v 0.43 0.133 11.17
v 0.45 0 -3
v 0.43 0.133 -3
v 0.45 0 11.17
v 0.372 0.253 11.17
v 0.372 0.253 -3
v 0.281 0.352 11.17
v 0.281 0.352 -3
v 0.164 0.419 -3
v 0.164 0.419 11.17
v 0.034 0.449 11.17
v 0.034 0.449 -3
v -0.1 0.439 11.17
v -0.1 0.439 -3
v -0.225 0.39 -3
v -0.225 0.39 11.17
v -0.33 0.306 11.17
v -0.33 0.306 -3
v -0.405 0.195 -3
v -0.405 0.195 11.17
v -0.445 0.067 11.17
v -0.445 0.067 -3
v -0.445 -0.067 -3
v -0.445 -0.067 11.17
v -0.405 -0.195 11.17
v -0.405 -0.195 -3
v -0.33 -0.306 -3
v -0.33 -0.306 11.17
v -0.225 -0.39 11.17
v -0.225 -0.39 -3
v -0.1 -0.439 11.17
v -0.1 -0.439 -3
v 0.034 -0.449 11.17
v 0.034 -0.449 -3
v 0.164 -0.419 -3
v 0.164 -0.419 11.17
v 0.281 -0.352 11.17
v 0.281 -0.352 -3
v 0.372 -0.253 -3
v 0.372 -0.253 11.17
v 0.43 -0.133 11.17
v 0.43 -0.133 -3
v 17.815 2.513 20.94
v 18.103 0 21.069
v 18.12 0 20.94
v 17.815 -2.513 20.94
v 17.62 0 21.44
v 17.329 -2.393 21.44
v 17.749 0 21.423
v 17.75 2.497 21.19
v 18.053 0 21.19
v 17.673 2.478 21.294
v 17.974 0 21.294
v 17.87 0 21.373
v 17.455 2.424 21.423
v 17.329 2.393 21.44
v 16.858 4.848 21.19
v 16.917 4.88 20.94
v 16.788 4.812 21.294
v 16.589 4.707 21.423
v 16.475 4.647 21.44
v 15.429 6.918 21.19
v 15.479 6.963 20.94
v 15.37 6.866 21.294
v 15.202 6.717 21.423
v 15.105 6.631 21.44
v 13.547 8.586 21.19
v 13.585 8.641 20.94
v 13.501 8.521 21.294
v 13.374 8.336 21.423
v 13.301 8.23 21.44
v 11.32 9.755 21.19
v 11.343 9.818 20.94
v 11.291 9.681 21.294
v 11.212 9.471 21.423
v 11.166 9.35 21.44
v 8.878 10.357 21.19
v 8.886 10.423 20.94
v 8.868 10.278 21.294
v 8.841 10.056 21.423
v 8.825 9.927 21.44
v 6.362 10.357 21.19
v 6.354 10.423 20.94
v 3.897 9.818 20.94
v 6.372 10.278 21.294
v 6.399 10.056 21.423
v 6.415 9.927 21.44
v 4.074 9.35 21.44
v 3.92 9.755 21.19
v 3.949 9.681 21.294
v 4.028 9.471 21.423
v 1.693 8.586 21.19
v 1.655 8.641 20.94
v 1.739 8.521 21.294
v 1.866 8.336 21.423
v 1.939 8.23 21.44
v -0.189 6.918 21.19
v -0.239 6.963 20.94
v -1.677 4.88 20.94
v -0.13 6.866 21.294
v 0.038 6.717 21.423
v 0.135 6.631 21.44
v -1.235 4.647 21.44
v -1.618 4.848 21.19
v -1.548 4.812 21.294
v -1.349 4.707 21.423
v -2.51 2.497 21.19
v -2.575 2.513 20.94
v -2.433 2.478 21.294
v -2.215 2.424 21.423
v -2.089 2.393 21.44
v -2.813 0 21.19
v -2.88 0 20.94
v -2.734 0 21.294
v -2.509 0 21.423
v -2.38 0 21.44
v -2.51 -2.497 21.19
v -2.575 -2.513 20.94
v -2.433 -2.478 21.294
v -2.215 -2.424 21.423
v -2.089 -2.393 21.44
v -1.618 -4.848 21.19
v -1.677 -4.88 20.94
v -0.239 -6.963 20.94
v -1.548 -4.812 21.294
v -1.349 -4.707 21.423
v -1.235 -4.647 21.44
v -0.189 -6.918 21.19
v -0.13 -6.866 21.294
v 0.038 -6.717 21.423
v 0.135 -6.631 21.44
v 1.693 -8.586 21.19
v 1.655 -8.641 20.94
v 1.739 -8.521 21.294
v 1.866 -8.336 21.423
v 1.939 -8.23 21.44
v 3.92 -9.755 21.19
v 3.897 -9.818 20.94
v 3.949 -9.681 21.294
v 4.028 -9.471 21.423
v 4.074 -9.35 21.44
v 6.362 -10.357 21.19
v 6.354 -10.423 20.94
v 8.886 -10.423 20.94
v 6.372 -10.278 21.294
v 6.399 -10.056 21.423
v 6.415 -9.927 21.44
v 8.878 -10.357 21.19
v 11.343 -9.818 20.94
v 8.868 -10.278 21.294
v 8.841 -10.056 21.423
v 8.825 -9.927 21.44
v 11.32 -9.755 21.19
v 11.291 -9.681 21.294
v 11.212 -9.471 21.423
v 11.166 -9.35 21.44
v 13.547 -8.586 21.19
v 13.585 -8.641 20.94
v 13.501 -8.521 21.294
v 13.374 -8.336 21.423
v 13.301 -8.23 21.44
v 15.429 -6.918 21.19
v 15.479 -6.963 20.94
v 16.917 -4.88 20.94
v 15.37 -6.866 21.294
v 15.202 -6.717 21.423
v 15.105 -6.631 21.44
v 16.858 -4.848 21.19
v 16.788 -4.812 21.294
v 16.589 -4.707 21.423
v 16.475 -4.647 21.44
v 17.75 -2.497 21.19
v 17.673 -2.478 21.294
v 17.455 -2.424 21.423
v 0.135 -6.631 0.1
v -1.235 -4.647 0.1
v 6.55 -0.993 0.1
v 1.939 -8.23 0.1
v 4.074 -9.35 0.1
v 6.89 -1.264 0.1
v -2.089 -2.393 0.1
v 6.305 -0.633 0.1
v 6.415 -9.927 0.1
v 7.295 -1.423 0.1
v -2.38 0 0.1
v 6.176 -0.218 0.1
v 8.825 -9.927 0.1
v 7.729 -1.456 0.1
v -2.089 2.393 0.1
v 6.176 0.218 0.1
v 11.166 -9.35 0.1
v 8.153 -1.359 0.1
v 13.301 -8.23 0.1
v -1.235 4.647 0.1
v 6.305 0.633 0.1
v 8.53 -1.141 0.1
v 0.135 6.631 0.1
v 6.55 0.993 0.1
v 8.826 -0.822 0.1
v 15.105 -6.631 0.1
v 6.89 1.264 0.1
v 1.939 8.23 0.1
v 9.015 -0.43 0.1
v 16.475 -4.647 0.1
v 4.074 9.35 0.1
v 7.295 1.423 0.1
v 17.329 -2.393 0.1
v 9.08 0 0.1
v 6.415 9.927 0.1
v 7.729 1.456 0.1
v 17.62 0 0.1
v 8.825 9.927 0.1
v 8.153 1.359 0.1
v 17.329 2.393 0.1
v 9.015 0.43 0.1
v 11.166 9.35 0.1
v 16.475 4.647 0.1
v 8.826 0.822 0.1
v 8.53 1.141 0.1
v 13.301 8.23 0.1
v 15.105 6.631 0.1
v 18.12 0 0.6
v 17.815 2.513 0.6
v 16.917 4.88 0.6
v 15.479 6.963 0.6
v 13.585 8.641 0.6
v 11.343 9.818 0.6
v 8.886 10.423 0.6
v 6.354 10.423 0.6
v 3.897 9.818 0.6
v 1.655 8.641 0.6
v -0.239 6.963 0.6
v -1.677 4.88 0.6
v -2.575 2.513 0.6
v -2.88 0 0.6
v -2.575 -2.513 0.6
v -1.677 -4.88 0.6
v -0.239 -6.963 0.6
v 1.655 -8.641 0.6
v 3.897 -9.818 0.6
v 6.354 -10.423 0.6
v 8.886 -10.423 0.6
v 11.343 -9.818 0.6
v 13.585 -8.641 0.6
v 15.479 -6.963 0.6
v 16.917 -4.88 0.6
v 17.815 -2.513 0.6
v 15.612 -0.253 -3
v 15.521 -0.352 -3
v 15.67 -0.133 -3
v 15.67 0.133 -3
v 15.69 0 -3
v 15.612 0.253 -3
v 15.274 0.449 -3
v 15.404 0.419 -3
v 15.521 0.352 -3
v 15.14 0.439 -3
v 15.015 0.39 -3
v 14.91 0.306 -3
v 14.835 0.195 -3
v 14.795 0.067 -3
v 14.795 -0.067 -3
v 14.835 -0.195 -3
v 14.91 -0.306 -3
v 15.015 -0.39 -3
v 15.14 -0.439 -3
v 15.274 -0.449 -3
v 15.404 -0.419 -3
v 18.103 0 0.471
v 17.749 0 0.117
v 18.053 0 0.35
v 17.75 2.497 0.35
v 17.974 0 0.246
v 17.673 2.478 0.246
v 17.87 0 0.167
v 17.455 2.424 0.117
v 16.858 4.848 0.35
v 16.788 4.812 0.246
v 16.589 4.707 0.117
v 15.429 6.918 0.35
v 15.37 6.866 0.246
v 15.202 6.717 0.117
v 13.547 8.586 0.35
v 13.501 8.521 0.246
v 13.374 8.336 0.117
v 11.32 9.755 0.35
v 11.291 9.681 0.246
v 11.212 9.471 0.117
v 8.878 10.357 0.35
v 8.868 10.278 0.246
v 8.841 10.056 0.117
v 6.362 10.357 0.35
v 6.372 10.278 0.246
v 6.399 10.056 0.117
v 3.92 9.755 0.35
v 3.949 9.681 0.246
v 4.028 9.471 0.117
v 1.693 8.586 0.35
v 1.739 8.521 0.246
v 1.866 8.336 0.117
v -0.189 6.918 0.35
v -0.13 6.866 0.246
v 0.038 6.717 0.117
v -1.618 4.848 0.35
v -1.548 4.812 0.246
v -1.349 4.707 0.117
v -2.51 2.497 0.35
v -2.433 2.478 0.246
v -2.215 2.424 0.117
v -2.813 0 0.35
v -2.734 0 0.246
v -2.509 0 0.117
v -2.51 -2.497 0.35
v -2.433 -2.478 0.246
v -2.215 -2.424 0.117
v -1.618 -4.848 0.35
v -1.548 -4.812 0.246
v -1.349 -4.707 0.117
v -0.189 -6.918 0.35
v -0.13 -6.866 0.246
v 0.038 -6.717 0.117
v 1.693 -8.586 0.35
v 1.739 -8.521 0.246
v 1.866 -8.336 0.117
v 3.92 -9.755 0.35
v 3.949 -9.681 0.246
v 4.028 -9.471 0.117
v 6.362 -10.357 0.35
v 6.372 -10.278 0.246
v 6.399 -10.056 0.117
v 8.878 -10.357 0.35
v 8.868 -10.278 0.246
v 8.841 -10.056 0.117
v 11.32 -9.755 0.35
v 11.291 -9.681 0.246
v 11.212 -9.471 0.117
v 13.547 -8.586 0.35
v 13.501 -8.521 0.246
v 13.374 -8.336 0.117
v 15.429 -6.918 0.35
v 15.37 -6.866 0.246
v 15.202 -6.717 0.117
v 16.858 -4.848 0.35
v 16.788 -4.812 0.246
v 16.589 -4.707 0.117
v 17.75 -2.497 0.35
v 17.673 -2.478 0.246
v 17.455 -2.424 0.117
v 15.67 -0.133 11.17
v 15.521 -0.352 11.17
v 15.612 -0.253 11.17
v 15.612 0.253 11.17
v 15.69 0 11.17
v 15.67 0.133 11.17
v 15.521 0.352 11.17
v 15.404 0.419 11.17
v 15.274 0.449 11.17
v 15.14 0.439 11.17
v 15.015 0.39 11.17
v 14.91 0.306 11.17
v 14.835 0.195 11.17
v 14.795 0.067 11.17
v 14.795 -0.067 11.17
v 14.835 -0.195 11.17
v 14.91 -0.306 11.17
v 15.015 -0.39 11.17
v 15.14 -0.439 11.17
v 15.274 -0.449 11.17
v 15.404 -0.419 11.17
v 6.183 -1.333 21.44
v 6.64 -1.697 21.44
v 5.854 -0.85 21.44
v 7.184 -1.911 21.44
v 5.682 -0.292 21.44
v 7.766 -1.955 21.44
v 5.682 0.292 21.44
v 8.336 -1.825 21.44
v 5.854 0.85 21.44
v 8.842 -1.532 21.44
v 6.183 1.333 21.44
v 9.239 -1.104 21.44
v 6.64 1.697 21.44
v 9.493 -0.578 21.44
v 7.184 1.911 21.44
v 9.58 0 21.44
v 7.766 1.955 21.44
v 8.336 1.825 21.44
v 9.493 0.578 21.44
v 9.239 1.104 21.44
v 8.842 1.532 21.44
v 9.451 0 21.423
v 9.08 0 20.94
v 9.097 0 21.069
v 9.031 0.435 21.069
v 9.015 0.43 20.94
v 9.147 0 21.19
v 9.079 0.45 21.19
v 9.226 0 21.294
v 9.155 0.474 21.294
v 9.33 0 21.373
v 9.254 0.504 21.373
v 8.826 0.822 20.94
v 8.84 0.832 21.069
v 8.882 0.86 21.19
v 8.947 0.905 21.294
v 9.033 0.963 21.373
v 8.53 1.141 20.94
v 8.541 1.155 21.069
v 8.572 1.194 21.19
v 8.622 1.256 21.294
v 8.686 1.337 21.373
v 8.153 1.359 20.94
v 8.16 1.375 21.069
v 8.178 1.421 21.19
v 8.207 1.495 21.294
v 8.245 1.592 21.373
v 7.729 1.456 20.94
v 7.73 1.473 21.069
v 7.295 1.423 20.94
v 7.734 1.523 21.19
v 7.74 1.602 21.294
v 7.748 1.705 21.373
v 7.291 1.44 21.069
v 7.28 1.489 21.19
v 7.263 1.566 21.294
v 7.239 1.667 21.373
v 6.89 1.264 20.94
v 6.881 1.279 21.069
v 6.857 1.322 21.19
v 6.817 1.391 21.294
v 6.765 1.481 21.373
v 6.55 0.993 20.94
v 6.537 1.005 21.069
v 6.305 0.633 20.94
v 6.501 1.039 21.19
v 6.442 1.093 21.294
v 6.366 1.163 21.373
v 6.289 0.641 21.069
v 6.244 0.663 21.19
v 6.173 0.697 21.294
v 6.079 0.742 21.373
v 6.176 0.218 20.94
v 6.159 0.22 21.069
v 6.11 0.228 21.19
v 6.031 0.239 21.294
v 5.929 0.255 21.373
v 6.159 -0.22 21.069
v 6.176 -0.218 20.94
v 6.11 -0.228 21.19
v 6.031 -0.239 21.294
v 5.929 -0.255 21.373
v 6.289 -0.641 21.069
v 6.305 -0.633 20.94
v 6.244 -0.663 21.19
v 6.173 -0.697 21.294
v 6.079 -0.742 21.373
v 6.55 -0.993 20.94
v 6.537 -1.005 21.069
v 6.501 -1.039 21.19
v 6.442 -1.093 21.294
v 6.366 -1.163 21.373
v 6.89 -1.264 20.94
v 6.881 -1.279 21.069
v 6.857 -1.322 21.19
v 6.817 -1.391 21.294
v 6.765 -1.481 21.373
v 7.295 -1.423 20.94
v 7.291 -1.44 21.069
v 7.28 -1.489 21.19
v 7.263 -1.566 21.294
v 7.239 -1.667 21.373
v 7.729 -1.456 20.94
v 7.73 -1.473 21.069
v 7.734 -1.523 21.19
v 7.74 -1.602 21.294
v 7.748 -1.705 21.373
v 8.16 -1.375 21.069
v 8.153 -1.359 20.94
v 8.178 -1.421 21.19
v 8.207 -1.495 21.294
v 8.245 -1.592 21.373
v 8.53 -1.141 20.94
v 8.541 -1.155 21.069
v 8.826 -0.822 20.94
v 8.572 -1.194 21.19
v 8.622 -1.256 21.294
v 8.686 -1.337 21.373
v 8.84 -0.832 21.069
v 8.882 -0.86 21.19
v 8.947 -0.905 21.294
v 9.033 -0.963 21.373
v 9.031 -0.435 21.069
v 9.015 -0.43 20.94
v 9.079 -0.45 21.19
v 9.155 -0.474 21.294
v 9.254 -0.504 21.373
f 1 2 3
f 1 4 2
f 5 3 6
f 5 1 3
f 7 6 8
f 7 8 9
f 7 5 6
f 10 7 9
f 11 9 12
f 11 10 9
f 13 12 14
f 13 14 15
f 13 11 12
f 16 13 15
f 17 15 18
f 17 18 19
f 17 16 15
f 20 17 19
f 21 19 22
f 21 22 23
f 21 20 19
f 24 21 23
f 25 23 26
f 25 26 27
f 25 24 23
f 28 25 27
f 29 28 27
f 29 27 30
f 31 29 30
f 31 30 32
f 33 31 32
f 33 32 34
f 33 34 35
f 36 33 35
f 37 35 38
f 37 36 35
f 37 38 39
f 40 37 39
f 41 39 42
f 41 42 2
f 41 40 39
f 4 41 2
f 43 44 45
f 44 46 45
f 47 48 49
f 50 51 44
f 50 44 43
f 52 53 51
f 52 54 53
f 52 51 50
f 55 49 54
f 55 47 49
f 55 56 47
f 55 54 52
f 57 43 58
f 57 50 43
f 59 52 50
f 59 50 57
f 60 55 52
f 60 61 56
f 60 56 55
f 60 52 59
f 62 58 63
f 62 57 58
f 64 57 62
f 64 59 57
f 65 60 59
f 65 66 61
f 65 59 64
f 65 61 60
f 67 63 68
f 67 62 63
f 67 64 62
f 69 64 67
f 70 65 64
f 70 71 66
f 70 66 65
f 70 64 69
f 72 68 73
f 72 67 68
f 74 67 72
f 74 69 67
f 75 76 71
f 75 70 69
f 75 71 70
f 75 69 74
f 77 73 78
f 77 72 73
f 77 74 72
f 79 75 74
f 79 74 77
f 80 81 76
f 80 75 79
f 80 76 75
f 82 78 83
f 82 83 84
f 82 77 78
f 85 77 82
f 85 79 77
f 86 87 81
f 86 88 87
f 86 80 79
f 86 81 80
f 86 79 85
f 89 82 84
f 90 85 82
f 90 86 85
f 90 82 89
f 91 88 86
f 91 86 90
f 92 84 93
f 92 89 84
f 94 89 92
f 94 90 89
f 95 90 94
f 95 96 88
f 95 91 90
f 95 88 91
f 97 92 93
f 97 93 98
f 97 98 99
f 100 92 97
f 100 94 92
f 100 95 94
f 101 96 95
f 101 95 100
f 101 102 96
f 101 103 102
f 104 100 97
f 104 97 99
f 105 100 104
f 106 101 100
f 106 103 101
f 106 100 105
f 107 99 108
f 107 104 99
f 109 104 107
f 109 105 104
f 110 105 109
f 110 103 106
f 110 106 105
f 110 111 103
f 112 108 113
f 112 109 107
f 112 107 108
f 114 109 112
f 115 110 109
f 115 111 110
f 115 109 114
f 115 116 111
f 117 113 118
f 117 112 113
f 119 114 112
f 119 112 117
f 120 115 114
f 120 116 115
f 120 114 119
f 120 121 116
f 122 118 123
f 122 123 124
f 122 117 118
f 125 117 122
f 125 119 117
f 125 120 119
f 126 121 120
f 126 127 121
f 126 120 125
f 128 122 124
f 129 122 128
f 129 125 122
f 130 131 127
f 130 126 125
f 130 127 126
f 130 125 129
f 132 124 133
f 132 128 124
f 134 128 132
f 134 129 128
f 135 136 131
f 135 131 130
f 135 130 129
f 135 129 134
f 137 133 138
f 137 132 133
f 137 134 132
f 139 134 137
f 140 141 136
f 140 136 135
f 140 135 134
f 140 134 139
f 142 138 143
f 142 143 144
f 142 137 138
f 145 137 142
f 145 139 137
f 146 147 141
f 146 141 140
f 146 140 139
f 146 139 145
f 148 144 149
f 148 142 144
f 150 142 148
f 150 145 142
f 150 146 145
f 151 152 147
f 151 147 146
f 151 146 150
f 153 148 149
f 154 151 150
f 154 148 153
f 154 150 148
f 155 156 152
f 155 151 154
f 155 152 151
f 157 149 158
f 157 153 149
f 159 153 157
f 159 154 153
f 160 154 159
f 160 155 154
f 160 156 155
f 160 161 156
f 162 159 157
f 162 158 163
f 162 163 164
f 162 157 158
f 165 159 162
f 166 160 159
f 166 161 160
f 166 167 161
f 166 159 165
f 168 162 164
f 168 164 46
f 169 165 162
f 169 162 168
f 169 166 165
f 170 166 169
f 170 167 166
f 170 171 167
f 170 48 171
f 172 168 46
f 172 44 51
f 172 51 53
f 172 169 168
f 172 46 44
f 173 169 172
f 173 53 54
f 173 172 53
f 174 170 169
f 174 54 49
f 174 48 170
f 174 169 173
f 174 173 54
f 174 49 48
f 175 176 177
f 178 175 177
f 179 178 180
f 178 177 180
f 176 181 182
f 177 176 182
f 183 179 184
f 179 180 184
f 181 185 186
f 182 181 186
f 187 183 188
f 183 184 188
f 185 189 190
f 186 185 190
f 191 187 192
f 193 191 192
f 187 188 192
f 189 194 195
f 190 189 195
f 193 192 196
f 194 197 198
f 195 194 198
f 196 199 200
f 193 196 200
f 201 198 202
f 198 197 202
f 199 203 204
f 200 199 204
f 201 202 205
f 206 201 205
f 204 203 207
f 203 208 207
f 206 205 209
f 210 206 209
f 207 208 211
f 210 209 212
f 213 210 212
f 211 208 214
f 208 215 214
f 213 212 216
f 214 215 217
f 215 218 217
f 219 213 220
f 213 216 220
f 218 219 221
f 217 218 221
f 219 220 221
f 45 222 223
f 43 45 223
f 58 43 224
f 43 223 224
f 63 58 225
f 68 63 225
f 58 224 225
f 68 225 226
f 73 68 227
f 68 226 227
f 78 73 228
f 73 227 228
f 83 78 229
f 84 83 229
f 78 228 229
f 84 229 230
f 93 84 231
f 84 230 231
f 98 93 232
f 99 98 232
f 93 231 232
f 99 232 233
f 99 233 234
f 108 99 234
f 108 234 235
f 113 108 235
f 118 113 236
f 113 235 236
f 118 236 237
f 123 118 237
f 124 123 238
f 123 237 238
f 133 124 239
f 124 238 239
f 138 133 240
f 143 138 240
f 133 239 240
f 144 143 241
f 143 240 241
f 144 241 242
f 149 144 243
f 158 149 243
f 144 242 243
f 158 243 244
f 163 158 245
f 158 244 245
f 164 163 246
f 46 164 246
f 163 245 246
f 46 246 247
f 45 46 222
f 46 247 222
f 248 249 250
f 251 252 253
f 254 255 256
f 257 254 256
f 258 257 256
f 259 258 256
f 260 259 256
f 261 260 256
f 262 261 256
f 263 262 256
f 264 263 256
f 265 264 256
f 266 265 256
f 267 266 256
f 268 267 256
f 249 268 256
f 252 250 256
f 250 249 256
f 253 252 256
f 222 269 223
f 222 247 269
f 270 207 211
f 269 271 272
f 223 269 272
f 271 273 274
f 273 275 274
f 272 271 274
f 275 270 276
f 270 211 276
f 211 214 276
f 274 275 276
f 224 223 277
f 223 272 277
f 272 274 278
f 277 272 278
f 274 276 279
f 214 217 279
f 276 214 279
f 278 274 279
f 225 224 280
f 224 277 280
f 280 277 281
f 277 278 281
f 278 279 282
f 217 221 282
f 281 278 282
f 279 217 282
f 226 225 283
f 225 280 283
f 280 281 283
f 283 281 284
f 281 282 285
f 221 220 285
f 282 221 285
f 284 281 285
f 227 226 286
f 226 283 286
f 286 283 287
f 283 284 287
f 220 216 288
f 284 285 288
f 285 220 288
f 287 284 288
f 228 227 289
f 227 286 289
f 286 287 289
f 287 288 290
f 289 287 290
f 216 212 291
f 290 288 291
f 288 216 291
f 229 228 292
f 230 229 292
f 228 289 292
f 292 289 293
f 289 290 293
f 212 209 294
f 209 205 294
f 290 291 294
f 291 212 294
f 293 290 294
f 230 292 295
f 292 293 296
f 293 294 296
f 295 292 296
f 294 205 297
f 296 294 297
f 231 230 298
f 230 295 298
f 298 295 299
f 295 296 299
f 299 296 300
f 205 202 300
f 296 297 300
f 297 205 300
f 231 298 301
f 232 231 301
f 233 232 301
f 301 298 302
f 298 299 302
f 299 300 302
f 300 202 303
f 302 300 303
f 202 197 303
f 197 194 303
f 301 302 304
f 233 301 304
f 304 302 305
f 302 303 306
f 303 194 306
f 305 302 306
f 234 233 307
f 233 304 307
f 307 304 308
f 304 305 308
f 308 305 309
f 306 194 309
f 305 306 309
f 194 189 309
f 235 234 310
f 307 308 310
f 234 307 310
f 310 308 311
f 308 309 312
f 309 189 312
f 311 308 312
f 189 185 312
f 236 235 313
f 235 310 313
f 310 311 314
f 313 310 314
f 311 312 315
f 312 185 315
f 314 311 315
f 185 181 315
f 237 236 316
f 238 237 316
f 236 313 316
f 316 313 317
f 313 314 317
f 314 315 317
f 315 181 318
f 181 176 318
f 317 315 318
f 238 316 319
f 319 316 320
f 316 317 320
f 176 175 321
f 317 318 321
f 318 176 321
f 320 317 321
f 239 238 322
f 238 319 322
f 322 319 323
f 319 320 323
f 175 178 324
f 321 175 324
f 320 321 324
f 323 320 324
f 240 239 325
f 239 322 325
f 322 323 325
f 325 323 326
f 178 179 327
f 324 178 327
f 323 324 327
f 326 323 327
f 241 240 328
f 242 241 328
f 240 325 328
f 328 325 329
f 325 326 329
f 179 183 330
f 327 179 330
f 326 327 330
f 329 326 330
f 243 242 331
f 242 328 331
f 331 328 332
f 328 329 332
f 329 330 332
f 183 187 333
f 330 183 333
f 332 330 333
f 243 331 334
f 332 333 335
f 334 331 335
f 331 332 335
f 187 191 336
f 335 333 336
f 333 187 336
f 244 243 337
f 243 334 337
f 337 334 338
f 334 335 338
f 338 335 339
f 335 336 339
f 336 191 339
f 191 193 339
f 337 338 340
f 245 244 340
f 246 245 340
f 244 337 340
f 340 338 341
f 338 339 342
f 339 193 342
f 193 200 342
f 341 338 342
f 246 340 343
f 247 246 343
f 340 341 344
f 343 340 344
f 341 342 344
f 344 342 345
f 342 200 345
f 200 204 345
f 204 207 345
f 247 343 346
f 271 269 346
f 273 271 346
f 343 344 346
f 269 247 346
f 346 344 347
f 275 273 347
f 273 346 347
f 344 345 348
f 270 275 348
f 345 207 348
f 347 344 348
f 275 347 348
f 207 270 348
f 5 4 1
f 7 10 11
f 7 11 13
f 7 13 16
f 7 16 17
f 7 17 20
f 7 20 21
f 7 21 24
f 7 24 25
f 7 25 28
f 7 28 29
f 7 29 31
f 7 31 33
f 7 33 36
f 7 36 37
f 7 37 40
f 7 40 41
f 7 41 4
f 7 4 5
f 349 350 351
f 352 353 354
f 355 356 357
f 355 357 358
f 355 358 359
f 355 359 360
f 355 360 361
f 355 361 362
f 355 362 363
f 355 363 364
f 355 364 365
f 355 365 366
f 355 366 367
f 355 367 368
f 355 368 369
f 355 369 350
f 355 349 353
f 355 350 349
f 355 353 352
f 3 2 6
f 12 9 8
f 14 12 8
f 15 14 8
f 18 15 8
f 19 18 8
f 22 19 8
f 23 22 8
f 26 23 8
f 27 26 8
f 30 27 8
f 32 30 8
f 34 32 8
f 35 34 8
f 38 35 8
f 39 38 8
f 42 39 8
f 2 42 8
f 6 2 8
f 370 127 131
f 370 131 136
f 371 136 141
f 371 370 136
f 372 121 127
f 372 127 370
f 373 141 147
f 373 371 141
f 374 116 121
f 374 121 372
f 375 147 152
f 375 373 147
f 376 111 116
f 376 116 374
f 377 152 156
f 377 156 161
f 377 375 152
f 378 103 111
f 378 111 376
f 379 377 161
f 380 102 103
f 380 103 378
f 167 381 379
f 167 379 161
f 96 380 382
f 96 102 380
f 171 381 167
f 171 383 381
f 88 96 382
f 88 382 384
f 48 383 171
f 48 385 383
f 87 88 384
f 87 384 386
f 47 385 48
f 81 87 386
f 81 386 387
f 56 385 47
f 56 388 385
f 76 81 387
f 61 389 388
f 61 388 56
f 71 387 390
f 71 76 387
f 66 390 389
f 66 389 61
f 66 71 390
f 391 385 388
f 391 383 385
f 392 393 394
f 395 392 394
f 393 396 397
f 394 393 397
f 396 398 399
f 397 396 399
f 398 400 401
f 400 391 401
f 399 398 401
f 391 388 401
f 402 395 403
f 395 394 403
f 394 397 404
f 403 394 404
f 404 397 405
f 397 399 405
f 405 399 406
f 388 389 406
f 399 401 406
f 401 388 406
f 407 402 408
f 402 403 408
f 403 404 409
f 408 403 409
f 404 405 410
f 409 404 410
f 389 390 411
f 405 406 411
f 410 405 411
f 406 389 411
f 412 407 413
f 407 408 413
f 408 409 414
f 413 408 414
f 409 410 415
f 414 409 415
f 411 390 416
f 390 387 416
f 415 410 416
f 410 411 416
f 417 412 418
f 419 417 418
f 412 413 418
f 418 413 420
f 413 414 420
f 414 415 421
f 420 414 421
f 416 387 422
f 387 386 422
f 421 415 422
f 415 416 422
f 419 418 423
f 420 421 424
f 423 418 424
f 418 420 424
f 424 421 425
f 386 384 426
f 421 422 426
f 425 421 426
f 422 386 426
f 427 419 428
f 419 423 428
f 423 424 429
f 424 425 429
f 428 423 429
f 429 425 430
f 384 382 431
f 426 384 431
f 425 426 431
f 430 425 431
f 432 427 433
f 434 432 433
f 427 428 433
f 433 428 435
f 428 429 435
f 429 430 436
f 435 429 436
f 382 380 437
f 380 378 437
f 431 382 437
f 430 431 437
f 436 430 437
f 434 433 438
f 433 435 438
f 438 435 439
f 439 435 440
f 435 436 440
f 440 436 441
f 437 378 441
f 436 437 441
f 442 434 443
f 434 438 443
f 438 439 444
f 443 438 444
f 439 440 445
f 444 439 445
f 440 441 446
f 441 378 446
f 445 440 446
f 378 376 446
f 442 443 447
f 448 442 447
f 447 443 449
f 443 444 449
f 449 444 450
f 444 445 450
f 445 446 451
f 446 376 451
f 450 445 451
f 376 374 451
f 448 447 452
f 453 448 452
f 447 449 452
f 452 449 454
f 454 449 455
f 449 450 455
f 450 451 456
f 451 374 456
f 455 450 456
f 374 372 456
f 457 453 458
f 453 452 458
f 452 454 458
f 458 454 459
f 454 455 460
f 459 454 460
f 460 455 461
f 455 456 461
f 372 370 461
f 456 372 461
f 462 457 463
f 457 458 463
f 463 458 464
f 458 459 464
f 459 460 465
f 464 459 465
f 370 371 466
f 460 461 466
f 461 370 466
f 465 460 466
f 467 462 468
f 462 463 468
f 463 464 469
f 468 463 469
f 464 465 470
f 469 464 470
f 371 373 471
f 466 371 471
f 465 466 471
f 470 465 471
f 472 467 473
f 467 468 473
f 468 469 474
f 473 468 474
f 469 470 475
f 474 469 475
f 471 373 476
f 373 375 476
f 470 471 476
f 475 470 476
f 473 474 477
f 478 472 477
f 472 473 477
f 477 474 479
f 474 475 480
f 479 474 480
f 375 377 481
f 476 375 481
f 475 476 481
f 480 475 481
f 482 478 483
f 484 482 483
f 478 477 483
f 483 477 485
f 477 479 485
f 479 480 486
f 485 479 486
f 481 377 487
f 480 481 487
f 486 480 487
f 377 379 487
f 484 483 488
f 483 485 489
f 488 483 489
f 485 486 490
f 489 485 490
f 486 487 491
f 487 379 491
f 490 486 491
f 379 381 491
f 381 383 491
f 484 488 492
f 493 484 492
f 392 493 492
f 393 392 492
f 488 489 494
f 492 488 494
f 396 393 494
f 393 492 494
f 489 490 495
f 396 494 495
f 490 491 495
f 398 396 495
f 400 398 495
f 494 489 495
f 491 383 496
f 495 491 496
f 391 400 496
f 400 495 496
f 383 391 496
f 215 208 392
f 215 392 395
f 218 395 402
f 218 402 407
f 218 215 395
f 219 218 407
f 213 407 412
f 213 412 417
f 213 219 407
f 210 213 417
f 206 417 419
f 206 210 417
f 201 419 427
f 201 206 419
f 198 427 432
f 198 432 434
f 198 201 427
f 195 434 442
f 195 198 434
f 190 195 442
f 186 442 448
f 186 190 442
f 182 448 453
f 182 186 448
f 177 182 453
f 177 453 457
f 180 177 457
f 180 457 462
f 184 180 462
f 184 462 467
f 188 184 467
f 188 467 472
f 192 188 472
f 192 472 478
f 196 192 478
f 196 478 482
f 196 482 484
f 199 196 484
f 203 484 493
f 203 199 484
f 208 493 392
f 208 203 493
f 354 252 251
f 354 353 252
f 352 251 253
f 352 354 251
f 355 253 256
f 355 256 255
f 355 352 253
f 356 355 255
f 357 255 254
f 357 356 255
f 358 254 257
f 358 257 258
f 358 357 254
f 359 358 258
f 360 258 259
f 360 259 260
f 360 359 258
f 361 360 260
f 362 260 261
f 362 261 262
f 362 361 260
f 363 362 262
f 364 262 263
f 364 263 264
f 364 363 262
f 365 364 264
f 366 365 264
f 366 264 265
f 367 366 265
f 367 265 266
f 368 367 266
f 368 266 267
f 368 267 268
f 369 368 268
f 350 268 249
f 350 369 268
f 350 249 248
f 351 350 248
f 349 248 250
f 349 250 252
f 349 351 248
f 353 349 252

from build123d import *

# Parameters (mm, degrees)
SKETCH001_R       = 0.45
PAD001_DEPTH      = 10.67
PAD001_DEPTH_BACK = 3.5
SKETCH_R          = 10.5
SKETCH_R_2        = 1.46
PAD_DEPTH         = 21.34
FILLET_R          = 0.5


with BuildPart() as pad001:
    # Sketch001 → Pad001 (new body, two sides)
    with BuildSketch(Plane.XY.offset(0.5)) as pad001_sk:
        Circle(SKETCH001_R)
        with Locations((15.24, 0)):
            Circle(SKETCH001_R)
    extrude(amount=PAD001_DEPTH)
    extrude(pad001_sk.sketch, amount=-PAD001_DEPTH_BACK)


with BuildPart() as fillet_body:
    # Sketch → Pad (new body)
    with BuildSketch(Plane.XY.offset(0.1)):
        with Locations((7.62, 0)):
            Circle(SKETCH_R)
        with Locations((7.62, 0)):
            Circle(SKETCH_R_2, mode=Mode.SUBTRACT)
    extrude(amount=PAD_DEPTH)

    # Fillet
    fillet_edges = [fillet_body.edges().sort_by_distance(p)[0] for p in [
        (6.16, 0, 21.44),
        (-2.88, 0, 21.44),
        (-2.88, 0, 0.1),
    ]]
    fillet(fillet_edges, radius=FILLET_R)


solid = Compound([pad001.part, fillet_body.part])
